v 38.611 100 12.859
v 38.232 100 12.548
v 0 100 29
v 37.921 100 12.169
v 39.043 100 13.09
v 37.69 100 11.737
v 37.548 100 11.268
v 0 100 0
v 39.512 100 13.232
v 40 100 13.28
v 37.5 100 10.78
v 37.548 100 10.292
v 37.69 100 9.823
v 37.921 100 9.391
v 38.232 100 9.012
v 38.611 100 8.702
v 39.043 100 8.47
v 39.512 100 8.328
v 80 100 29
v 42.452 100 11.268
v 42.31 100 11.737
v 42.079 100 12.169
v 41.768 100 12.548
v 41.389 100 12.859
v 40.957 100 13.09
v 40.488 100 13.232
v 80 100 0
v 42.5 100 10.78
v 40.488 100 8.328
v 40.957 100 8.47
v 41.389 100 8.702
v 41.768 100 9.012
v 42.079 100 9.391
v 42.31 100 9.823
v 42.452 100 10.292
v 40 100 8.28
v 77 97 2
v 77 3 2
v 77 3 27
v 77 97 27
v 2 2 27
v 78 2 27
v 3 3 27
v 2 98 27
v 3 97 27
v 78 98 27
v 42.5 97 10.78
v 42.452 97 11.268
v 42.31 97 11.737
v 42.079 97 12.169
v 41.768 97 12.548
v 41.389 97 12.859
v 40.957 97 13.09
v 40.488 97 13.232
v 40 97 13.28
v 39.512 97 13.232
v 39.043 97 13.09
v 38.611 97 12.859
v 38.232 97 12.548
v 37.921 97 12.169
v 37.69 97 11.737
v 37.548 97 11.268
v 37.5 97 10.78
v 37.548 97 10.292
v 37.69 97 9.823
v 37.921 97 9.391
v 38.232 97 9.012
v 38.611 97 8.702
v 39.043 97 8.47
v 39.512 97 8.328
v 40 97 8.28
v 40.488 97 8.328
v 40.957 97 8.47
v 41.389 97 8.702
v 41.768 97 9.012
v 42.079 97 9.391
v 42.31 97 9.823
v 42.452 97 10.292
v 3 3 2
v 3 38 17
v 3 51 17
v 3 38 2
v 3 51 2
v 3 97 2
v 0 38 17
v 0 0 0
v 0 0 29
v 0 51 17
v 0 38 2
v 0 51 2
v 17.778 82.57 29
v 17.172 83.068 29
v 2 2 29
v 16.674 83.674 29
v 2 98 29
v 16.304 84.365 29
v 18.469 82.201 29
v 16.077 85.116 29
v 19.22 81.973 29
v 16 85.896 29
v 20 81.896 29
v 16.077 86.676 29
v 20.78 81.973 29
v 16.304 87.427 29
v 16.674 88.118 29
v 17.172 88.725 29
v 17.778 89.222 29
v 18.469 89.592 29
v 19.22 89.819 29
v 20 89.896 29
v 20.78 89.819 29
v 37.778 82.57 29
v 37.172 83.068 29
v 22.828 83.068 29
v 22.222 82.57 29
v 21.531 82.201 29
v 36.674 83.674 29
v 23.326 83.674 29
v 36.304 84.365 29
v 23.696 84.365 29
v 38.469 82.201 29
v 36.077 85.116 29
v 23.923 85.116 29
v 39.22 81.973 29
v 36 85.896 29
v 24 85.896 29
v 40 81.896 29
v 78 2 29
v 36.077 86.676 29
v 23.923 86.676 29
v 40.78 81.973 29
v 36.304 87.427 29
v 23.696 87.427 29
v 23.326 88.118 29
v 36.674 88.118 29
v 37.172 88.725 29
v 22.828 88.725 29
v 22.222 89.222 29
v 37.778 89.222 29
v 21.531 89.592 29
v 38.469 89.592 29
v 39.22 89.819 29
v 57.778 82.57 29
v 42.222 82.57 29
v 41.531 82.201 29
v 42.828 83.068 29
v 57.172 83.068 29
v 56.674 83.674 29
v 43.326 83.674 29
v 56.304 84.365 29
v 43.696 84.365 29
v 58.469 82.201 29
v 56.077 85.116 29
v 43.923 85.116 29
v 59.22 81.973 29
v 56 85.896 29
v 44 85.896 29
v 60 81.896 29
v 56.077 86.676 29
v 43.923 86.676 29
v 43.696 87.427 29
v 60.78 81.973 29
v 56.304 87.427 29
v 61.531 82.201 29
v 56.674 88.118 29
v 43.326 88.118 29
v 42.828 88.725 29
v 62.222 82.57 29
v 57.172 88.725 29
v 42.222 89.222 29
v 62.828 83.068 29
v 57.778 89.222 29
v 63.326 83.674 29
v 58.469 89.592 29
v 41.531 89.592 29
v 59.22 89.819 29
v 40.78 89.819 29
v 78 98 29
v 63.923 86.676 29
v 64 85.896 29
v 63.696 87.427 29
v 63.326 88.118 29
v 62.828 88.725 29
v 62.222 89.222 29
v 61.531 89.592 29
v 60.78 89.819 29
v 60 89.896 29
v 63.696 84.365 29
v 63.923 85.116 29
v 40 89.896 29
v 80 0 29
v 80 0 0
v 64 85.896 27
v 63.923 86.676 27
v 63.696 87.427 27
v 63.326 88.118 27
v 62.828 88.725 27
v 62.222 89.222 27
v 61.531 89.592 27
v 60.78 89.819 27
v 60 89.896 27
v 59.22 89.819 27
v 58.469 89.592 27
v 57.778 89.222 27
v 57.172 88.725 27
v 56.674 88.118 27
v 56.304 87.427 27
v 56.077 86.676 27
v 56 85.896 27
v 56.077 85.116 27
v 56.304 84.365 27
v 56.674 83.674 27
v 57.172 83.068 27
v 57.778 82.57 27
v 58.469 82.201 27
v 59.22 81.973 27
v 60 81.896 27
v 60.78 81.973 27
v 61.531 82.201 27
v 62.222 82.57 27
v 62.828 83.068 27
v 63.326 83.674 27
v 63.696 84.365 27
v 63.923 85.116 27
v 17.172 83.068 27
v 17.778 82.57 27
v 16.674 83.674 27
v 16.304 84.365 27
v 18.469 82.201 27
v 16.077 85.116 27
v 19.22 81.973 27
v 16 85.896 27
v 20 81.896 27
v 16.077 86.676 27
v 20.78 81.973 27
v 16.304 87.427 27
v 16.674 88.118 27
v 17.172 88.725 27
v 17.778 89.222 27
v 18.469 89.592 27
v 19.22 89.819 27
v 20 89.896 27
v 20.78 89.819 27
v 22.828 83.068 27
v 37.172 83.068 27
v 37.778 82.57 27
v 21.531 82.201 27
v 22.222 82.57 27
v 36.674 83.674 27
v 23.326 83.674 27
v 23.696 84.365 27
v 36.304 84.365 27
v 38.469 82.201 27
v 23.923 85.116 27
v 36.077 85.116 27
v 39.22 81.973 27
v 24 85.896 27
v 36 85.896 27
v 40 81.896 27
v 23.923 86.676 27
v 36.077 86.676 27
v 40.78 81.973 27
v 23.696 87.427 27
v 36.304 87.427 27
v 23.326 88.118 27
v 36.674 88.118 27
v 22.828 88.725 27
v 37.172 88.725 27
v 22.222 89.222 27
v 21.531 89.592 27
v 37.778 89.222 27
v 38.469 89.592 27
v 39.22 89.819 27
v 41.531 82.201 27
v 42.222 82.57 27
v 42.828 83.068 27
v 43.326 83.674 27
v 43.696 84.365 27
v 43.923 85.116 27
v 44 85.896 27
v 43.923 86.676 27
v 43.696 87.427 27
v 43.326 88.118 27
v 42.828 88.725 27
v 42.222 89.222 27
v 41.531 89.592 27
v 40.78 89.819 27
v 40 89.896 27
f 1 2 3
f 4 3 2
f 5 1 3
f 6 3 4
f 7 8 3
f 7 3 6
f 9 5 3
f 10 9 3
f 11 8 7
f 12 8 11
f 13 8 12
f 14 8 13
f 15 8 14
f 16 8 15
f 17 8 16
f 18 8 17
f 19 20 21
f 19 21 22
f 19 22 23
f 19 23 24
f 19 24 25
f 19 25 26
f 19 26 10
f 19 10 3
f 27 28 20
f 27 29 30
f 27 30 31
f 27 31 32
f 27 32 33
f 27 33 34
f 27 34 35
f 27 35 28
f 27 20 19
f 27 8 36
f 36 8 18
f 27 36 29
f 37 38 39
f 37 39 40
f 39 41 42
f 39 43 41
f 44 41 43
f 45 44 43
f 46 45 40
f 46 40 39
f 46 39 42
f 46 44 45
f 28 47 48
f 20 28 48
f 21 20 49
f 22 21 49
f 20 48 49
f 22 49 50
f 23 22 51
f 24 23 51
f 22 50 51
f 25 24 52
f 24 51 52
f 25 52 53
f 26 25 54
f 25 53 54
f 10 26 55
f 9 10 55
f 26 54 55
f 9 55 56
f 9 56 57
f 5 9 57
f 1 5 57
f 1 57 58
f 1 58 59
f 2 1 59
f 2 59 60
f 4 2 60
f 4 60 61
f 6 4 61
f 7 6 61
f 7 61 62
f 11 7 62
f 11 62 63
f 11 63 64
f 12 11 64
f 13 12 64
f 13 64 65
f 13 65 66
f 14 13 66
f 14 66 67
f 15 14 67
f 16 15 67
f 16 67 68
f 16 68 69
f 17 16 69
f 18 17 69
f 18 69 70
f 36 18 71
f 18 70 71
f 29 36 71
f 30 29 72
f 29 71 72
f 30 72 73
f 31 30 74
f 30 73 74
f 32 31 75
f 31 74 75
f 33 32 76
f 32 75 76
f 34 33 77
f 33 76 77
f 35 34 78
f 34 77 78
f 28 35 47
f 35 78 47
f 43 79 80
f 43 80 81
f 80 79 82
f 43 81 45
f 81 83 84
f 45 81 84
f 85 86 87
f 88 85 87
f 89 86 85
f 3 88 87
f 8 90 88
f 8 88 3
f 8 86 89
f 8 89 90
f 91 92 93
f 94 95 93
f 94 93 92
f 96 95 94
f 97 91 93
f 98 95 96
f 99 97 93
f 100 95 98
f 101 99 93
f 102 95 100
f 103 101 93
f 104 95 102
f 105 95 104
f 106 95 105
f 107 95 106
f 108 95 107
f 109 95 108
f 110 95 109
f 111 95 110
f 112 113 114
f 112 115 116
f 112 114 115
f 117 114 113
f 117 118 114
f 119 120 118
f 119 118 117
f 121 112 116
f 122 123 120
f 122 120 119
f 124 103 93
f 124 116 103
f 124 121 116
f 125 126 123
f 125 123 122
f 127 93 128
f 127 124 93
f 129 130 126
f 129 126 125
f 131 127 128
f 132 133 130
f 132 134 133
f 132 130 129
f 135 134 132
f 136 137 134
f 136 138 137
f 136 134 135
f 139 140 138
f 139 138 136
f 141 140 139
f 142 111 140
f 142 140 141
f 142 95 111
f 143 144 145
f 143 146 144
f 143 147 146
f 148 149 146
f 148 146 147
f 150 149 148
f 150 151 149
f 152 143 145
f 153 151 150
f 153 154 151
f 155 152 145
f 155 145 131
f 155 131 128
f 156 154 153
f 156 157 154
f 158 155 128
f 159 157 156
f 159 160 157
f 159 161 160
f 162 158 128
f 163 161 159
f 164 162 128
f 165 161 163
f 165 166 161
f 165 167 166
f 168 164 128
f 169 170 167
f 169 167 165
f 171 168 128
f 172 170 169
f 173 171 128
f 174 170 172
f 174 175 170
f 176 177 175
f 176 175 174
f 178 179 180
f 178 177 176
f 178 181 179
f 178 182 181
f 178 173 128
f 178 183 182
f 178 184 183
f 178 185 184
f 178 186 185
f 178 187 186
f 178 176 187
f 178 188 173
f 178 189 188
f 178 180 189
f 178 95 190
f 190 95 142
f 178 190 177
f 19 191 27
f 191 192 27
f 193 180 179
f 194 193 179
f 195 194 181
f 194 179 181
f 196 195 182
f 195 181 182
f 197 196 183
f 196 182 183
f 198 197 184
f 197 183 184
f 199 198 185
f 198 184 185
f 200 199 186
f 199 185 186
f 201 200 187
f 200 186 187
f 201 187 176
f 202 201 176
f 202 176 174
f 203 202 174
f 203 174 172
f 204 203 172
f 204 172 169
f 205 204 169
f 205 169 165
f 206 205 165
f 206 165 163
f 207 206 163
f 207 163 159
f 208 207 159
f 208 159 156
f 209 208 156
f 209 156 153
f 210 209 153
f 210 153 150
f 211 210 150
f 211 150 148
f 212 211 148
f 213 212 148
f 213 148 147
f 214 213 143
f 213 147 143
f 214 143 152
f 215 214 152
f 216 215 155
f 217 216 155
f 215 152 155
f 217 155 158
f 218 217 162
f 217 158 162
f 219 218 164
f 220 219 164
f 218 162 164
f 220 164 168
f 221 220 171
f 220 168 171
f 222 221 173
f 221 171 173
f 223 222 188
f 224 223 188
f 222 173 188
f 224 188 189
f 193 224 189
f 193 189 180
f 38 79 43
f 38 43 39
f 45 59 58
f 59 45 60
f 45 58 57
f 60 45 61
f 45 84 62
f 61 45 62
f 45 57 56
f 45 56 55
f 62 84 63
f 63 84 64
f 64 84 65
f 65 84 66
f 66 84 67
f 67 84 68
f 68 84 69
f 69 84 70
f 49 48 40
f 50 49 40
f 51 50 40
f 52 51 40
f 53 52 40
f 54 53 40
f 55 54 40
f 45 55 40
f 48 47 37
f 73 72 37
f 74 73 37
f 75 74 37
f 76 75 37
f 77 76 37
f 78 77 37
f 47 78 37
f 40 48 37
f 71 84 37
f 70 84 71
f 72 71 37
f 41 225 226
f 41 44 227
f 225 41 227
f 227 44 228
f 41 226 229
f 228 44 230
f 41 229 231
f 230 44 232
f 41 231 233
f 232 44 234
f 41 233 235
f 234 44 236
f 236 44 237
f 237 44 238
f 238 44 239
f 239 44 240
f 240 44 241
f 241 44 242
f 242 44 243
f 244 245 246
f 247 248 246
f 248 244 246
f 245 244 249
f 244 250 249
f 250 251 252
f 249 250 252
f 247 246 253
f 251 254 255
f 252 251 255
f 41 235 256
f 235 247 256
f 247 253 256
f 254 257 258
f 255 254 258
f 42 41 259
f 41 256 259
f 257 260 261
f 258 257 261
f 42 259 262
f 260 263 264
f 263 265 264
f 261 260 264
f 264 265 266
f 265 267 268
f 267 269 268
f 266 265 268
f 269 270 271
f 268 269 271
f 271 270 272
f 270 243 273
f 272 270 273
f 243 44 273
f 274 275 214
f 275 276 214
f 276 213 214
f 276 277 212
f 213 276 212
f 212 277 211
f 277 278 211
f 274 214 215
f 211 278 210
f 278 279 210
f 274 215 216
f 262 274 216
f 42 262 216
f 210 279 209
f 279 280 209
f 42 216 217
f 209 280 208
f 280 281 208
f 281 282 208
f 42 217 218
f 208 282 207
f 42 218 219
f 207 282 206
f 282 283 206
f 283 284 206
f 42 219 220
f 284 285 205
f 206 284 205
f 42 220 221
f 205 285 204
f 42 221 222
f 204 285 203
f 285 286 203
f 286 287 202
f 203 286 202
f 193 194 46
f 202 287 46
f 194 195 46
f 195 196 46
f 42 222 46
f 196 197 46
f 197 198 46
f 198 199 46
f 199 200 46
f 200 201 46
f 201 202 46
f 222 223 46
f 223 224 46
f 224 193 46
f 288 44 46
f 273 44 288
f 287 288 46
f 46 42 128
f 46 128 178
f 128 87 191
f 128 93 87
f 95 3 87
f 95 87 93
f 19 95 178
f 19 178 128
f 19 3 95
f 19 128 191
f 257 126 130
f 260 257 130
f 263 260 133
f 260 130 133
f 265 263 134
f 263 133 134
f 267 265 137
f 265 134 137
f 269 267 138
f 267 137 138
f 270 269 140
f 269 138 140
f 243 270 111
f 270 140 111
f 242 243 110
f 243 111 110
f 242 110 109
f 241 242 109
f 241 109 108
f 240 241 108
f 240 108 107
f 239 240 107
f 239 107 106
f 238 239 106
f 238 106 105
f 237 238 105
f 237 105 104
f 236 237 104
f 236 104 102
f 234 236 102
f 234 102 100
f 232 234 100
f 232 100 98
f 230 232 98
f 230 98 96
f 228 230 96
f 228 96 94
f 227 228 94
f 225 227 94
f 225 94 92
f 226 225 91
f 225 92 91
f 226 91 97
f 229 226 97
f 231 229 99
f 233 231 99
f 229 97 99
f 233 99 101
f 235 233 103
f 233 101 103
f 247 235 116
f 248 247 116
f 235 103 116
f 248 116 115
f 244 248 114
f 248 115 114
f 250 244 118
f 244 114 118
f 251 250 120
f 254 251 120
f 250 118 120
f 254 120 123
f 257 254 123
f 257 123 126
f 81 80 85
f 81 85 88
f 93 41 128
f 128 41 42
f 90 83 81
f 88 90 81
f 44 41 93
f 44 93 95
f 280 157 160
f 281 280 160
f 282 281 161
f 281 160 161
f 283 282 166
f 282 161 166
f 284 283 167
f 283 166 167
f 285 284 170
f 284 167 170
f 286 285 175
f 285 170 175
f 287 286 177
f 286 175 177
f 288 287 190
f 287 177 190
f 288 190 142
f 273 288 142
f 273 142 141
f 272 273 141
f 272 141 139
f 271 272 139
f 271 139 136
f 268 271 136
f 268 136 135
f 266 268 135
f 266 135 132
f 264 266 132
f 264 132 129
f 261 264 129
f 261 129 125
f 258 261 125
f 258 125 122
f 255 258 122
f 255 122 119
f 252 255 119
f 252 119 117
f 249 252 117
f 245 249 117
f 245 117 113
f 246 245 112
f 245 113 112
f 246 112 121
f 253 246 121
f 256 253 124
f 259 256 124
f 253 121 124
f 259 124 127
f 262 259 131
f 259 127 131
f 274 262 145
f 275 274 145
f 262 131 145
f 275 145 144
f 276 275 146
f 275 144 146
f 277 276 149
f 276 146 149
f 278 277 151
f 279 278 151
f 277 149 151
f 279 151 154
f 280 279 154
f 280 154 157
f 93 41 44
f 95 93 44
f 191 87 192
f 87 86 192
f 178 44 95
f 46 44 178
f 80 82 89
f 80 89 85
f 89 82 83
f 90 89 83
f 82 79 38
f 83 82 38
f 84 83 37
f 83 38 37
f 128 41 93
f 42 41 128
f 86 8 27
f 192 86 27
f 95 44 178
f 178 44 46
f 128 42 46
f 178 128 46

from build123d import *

# Parameters (mm, degrees)
F0_W      = 80
F0_H      = 100
F1_DEPTH  = 2
F2_W      = 80
F2_H      = 100
F2_W_2    = 74
F2_H_2    = 94
F3_DEPTH  = 25
F4_W      = 13
F4_H      = 15
F5_DEPTH  = 3.001
F6_W      = 80
F6_H      = 100
F6_W_2    = 76
F6_H_2    = 96
F7_DEPTH  = 2
F8_W      = 76
F8_H      = 96
F9_DEPTH  = 2
F10_R     = 2.5
F11_DEPTH = 3.001
F12_R     = 4
F13_DEPTH = 29.001


with BuildPart() as f1:
    # F0 (on Top) → F1 (new body)
    with BuildSketch(Plane.XY):
        with Locations((40, 50)):
            Rectangle(F0_W, F0_H)
    extrude(amount=F1_DEPTH)

    # F2 (on face) → F3 (join)
    with BuildSketch(Plane.XY.offset(2)):
        with Locations((40, 50)):
            Rectangle(F2_W, F2_H)
        with Locations((40, 50)):
            Rectangle(F2_W_2, F2_H_2, mode=Mode.SUBTRACT)
    extrude(amount=F3_DEPTH)

    # F4 (on face) → F5 (cut, through all)
    with BuildSketch(Plane.YZ.offset(3)):
        with Locations((44.5, 9.5)):
            Rectangle(F4_W, F4_H)
    extrude(amount=-F5_DEPTH, mode=Mode.SUBTRACT)

    # F6 (on face) → F7 (join)
    with BuildSketch(Plane.XY.offset(27)):
        with Locations((40, 50)):
            Rectangle(F6_W, F6_H)
        with Locations((40, 50)):
            Rectangle(F6_W_2, F6_H_2, mode=Mode.SUBTRACT)
    extrude(amount=F7_DEPTH)

    # F10 (on face) → F11 (cut, through all)
    with BuildSketch(Plane.XZ.offset(-97)):
        with Locations((40, 10.7801919803)):
            Circle(F10_R)
    extrude(amount=-F11_DEPTH, mode=Mode.SUBTRACT)


with BuildPart() as f9:
    # F8 (on face) → F9 (new body)
    with BuildSketch(Plane.XY.offset(27)):
        with Locations((40, 50)):
            Rectangle(F8_W, F8_H)
    extrude(amount=F9_DEPTH)

    # F12 (on face) → F13 (cut, through all)
    with BuildSketch(Plane.XY.offset(29)):
        with Locations((20, 85.8960747719)):
            Circle(F12_R)
        with Locations((40, 85.8960747719)):
            Circle(F12_R)
        with Locations((60, 85.8960747719)):
            Circle(F12_R)
    extrude(amount=-F13_DEPTH, mode=Mode.SUBTRACT)


solid = Compound([f1.part, f9.part])
